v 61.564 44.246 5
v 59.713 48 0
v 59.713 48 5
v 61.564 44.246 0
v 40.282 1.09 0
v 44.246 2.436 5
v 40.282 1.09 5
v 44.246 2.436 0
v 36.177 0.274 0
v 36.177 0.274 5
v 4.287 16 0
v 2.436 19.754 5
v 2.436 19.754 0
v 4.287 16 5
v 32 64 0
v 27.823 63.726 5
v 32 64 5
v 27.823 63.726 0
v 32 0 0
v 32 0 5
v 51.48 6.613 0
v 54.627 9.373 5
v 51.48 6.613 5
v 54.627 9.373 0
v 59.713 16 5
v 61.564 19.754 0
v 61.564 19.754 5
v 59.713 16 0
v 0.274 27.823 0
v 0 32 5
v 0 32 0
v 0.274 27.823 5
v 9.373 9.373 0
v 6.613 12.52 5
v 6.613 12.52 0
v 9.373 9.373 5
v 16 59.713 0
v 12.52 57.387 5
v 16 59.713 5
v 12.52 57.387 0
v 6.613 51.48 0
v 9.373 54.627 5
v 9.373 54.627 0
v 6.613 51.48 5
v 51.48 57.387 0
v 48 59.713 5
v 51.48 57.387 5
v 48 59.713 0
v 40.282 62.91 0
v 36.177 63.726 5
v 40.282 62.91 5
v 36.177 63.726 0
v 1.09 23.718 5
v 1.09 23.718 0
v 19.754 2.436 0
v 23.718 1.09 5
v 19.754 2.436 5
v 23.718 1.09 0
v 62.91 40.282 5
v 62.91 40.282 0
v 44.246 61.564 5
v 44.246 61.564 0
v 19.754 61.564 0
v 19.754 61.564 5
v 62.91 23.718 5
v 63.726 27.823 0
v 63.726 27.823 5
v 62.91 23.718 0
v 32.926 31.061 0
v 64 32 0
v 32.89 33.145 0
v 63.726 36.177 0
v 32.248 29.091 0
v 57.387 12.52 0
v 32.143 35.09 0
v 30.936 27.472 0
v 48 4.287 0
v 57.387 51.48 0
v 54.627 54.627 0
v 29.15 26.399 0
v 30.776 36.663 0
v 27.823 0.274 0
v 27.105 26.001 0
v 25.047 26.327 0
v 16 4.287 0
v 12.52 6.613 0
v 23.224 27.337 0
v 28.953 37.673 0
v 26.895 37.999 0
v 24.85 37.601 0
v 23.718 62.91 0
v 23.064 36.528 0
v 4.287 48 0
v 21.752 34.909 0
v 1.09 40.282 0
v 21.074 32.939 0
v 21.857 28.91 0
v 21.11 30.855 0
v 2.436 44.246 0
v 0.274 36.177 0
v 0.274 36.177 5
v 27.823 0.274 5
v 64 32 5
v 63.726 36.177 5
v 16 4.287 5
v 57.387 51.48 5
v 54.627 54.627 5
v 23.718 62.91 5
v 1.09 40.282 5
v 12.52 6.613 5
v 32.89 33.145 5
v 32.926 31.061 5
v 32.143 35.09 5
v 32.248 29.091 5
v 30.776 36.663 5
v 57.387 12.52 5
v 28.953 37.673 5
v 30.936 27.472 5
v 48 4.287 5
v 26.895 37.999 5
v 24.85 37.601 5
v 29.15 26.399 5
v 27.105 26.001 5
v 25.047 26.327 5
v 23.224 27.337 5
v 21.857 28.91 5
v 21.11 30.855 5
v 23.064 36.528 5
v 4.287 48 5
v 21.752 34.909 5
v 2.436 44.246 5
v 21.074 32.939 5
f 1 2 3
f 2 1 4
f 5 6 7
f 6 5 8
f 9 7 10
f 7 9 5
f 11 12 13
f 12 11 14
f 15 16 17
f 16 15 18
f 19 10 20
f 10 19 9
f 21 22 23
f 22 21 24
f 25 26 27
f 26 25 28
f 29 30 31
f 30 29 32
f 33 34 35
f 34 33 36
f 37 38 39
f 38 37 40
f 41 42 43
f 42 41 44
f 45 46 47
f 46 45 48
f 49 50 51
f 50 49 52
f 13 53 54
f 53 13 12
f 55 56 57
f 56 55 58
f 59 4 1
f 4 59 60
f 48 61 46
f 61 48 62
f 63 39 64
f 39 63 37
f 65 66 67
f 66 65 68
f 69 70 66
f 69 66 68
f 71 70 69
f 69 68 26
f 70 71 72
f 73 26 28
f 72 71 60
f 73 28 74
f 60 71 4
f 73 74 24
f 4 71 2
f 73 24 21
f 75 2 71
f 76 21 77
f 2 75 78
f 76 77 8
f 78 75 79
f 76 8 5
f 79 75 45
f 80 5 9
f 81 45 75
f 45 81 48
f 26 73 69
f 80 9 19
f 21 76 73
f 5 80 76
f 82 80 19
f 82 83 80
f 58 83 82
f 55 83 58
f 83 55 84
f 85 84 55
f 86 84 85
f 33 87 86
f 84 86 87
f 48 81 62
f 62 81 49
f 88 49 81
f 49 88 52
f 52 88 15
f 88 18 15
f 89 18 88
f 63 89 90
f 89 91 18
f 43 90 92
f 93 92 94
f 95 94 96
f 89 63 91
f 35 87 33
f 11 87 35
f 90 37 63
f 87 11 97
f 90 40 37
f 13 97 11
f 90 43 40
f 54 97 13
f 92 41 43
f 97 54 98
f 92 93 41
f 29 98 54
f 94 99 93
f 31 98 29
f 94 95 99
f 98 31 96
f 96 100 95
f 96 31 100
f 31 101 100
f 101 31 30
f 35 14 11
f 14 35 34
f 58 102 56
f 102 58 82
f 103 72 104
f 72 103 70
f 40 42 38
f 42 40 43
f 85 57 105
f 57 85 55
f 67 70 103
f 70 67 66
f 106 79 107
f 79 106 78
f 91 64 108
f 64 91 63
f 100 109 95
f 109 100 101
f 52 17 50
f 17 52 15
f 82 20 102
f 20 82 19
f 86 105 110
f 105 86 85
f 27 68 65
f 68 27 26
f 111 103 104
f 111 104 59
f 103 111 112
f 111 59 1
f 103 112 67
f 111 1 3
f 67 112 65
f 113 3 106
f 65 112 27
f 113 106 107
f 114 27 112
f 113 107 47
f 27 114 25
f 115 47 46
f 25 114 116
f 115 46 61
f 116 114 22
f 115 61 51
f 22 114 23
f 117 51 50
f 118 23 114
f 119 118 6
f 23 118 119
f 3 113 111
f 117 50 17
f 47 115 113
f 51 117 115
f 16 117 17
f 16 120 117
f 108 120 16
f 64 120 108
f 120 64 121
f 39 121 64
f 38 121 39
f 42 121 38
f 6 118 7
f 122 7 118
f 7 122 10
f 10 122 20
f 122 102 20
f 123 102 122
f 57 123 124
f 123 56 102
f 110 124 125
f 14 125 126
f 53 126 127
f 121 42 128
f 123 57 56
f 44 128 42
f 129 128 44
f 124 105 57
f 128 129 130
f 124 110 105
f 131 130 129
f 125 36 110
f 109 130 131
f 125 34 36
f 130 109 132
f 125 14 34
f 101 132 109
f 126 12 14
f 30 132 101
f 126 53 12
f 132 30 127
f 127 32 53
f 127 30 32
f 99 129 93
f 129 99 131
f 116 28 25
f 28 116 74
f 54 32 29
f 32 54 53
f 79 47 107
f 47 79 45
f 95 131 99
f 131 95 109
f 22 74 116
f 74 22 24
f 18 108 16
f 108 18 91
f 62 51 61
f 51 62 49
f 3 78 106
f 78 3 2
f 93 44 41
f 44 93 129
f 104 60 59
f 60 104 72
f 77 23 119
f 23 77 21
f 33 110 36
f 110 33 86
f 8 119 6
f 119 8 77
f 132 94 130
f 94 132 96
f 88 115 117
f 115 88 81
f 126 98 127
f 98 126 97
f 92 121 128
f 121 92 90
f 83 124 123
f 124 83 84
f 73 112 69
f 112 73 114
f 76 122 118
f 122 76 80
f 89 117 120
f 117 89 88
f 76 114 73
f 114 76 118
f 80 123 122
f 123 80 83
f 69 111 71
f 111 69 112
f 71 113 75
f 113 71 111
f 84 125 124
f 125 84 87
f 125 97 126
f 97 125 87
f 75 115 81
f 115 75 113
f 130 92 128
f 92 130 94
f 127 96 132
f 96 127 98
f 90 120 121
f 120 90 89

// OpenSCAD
$fn = 32;

// ----------------------------------------------------------------------
// Cam plate: eccentric cam, base R32
// ----------------------------------------------------------------------

// --- parameters (mm) ---
base_r = 32;              // base circle radius
lobe_h = 10;              // cam lobe rise
bore_r = 6;               // shaft bore radius
plate_t = 5;              // plate thickness, Z (extrusion height)
ecc = 5;                  // disc eccentricity

profile = [[64, 32], [63.726, 36.177], [62.91, 40.282], [61.564, 44.246], [59.713, 48], [57.387, 51.48], [54.627, 54.627], [51.48, 57.387], [48, 59.713], [44.246, 61.564], [40.282, 62.91], [36.177, 63.726], [32, 64], [27.823, 63.726], [23.718, 62.91], [19.754, 61.564], [16, 59.713], [12.52, 57.387], [9.373, 54.627], [6.613, 51.48], [4.287, 48], [2.436, 44.246], [1.09, 40.282], [0.274, 36.177], [0, 32], [0.274, 27.823], [1.09, 23.718], [2.436, 19.754], [4.287, 16], [6.613, 12.52], [9.373, 9.373], [12.52, 6.613], [16, 4.287], [19.754, 2.436], [23.718, 1.09], [27.823, 0.274], [32, 0], [36.177, 0.274], [40.282, 1.09], [44.246, 2.436], [48, 4.287], [51.48, 6.613], [54.627, 9.373], [57.387, 12.52], [59.713, 16], [61.564, 19.754], [62.91, 23.718], [63.726, 27.823]];  // primary outline, 48 points, counter clockwise
void_1 = [[32.89, 33.145], [32.143, 35.09], [30.776, 36.663], [28.953, 37.673], [26.895, 37.999], [24.85, 37.601], [23.064, 36.528], [21.752, 34.909], [21.074, 32.939], [21.11, 30.855], [21.857, 28.91], [23.224, 27.337], [25.047, 26.327], [27.105, 26.001], [29.15, 26.399], [30.936, 27.472], [32.248, 29.091], [32.926, 31.061]];  // shaft bore, 18 points

// --- the one profile operation ---
difference() {
  linear_extrude(height = plate_t) polygon(points = profile);
  translate([0, 0, -1])
    linear_extrude(height = plate_t + 2) polygon(points = void_1);
}
